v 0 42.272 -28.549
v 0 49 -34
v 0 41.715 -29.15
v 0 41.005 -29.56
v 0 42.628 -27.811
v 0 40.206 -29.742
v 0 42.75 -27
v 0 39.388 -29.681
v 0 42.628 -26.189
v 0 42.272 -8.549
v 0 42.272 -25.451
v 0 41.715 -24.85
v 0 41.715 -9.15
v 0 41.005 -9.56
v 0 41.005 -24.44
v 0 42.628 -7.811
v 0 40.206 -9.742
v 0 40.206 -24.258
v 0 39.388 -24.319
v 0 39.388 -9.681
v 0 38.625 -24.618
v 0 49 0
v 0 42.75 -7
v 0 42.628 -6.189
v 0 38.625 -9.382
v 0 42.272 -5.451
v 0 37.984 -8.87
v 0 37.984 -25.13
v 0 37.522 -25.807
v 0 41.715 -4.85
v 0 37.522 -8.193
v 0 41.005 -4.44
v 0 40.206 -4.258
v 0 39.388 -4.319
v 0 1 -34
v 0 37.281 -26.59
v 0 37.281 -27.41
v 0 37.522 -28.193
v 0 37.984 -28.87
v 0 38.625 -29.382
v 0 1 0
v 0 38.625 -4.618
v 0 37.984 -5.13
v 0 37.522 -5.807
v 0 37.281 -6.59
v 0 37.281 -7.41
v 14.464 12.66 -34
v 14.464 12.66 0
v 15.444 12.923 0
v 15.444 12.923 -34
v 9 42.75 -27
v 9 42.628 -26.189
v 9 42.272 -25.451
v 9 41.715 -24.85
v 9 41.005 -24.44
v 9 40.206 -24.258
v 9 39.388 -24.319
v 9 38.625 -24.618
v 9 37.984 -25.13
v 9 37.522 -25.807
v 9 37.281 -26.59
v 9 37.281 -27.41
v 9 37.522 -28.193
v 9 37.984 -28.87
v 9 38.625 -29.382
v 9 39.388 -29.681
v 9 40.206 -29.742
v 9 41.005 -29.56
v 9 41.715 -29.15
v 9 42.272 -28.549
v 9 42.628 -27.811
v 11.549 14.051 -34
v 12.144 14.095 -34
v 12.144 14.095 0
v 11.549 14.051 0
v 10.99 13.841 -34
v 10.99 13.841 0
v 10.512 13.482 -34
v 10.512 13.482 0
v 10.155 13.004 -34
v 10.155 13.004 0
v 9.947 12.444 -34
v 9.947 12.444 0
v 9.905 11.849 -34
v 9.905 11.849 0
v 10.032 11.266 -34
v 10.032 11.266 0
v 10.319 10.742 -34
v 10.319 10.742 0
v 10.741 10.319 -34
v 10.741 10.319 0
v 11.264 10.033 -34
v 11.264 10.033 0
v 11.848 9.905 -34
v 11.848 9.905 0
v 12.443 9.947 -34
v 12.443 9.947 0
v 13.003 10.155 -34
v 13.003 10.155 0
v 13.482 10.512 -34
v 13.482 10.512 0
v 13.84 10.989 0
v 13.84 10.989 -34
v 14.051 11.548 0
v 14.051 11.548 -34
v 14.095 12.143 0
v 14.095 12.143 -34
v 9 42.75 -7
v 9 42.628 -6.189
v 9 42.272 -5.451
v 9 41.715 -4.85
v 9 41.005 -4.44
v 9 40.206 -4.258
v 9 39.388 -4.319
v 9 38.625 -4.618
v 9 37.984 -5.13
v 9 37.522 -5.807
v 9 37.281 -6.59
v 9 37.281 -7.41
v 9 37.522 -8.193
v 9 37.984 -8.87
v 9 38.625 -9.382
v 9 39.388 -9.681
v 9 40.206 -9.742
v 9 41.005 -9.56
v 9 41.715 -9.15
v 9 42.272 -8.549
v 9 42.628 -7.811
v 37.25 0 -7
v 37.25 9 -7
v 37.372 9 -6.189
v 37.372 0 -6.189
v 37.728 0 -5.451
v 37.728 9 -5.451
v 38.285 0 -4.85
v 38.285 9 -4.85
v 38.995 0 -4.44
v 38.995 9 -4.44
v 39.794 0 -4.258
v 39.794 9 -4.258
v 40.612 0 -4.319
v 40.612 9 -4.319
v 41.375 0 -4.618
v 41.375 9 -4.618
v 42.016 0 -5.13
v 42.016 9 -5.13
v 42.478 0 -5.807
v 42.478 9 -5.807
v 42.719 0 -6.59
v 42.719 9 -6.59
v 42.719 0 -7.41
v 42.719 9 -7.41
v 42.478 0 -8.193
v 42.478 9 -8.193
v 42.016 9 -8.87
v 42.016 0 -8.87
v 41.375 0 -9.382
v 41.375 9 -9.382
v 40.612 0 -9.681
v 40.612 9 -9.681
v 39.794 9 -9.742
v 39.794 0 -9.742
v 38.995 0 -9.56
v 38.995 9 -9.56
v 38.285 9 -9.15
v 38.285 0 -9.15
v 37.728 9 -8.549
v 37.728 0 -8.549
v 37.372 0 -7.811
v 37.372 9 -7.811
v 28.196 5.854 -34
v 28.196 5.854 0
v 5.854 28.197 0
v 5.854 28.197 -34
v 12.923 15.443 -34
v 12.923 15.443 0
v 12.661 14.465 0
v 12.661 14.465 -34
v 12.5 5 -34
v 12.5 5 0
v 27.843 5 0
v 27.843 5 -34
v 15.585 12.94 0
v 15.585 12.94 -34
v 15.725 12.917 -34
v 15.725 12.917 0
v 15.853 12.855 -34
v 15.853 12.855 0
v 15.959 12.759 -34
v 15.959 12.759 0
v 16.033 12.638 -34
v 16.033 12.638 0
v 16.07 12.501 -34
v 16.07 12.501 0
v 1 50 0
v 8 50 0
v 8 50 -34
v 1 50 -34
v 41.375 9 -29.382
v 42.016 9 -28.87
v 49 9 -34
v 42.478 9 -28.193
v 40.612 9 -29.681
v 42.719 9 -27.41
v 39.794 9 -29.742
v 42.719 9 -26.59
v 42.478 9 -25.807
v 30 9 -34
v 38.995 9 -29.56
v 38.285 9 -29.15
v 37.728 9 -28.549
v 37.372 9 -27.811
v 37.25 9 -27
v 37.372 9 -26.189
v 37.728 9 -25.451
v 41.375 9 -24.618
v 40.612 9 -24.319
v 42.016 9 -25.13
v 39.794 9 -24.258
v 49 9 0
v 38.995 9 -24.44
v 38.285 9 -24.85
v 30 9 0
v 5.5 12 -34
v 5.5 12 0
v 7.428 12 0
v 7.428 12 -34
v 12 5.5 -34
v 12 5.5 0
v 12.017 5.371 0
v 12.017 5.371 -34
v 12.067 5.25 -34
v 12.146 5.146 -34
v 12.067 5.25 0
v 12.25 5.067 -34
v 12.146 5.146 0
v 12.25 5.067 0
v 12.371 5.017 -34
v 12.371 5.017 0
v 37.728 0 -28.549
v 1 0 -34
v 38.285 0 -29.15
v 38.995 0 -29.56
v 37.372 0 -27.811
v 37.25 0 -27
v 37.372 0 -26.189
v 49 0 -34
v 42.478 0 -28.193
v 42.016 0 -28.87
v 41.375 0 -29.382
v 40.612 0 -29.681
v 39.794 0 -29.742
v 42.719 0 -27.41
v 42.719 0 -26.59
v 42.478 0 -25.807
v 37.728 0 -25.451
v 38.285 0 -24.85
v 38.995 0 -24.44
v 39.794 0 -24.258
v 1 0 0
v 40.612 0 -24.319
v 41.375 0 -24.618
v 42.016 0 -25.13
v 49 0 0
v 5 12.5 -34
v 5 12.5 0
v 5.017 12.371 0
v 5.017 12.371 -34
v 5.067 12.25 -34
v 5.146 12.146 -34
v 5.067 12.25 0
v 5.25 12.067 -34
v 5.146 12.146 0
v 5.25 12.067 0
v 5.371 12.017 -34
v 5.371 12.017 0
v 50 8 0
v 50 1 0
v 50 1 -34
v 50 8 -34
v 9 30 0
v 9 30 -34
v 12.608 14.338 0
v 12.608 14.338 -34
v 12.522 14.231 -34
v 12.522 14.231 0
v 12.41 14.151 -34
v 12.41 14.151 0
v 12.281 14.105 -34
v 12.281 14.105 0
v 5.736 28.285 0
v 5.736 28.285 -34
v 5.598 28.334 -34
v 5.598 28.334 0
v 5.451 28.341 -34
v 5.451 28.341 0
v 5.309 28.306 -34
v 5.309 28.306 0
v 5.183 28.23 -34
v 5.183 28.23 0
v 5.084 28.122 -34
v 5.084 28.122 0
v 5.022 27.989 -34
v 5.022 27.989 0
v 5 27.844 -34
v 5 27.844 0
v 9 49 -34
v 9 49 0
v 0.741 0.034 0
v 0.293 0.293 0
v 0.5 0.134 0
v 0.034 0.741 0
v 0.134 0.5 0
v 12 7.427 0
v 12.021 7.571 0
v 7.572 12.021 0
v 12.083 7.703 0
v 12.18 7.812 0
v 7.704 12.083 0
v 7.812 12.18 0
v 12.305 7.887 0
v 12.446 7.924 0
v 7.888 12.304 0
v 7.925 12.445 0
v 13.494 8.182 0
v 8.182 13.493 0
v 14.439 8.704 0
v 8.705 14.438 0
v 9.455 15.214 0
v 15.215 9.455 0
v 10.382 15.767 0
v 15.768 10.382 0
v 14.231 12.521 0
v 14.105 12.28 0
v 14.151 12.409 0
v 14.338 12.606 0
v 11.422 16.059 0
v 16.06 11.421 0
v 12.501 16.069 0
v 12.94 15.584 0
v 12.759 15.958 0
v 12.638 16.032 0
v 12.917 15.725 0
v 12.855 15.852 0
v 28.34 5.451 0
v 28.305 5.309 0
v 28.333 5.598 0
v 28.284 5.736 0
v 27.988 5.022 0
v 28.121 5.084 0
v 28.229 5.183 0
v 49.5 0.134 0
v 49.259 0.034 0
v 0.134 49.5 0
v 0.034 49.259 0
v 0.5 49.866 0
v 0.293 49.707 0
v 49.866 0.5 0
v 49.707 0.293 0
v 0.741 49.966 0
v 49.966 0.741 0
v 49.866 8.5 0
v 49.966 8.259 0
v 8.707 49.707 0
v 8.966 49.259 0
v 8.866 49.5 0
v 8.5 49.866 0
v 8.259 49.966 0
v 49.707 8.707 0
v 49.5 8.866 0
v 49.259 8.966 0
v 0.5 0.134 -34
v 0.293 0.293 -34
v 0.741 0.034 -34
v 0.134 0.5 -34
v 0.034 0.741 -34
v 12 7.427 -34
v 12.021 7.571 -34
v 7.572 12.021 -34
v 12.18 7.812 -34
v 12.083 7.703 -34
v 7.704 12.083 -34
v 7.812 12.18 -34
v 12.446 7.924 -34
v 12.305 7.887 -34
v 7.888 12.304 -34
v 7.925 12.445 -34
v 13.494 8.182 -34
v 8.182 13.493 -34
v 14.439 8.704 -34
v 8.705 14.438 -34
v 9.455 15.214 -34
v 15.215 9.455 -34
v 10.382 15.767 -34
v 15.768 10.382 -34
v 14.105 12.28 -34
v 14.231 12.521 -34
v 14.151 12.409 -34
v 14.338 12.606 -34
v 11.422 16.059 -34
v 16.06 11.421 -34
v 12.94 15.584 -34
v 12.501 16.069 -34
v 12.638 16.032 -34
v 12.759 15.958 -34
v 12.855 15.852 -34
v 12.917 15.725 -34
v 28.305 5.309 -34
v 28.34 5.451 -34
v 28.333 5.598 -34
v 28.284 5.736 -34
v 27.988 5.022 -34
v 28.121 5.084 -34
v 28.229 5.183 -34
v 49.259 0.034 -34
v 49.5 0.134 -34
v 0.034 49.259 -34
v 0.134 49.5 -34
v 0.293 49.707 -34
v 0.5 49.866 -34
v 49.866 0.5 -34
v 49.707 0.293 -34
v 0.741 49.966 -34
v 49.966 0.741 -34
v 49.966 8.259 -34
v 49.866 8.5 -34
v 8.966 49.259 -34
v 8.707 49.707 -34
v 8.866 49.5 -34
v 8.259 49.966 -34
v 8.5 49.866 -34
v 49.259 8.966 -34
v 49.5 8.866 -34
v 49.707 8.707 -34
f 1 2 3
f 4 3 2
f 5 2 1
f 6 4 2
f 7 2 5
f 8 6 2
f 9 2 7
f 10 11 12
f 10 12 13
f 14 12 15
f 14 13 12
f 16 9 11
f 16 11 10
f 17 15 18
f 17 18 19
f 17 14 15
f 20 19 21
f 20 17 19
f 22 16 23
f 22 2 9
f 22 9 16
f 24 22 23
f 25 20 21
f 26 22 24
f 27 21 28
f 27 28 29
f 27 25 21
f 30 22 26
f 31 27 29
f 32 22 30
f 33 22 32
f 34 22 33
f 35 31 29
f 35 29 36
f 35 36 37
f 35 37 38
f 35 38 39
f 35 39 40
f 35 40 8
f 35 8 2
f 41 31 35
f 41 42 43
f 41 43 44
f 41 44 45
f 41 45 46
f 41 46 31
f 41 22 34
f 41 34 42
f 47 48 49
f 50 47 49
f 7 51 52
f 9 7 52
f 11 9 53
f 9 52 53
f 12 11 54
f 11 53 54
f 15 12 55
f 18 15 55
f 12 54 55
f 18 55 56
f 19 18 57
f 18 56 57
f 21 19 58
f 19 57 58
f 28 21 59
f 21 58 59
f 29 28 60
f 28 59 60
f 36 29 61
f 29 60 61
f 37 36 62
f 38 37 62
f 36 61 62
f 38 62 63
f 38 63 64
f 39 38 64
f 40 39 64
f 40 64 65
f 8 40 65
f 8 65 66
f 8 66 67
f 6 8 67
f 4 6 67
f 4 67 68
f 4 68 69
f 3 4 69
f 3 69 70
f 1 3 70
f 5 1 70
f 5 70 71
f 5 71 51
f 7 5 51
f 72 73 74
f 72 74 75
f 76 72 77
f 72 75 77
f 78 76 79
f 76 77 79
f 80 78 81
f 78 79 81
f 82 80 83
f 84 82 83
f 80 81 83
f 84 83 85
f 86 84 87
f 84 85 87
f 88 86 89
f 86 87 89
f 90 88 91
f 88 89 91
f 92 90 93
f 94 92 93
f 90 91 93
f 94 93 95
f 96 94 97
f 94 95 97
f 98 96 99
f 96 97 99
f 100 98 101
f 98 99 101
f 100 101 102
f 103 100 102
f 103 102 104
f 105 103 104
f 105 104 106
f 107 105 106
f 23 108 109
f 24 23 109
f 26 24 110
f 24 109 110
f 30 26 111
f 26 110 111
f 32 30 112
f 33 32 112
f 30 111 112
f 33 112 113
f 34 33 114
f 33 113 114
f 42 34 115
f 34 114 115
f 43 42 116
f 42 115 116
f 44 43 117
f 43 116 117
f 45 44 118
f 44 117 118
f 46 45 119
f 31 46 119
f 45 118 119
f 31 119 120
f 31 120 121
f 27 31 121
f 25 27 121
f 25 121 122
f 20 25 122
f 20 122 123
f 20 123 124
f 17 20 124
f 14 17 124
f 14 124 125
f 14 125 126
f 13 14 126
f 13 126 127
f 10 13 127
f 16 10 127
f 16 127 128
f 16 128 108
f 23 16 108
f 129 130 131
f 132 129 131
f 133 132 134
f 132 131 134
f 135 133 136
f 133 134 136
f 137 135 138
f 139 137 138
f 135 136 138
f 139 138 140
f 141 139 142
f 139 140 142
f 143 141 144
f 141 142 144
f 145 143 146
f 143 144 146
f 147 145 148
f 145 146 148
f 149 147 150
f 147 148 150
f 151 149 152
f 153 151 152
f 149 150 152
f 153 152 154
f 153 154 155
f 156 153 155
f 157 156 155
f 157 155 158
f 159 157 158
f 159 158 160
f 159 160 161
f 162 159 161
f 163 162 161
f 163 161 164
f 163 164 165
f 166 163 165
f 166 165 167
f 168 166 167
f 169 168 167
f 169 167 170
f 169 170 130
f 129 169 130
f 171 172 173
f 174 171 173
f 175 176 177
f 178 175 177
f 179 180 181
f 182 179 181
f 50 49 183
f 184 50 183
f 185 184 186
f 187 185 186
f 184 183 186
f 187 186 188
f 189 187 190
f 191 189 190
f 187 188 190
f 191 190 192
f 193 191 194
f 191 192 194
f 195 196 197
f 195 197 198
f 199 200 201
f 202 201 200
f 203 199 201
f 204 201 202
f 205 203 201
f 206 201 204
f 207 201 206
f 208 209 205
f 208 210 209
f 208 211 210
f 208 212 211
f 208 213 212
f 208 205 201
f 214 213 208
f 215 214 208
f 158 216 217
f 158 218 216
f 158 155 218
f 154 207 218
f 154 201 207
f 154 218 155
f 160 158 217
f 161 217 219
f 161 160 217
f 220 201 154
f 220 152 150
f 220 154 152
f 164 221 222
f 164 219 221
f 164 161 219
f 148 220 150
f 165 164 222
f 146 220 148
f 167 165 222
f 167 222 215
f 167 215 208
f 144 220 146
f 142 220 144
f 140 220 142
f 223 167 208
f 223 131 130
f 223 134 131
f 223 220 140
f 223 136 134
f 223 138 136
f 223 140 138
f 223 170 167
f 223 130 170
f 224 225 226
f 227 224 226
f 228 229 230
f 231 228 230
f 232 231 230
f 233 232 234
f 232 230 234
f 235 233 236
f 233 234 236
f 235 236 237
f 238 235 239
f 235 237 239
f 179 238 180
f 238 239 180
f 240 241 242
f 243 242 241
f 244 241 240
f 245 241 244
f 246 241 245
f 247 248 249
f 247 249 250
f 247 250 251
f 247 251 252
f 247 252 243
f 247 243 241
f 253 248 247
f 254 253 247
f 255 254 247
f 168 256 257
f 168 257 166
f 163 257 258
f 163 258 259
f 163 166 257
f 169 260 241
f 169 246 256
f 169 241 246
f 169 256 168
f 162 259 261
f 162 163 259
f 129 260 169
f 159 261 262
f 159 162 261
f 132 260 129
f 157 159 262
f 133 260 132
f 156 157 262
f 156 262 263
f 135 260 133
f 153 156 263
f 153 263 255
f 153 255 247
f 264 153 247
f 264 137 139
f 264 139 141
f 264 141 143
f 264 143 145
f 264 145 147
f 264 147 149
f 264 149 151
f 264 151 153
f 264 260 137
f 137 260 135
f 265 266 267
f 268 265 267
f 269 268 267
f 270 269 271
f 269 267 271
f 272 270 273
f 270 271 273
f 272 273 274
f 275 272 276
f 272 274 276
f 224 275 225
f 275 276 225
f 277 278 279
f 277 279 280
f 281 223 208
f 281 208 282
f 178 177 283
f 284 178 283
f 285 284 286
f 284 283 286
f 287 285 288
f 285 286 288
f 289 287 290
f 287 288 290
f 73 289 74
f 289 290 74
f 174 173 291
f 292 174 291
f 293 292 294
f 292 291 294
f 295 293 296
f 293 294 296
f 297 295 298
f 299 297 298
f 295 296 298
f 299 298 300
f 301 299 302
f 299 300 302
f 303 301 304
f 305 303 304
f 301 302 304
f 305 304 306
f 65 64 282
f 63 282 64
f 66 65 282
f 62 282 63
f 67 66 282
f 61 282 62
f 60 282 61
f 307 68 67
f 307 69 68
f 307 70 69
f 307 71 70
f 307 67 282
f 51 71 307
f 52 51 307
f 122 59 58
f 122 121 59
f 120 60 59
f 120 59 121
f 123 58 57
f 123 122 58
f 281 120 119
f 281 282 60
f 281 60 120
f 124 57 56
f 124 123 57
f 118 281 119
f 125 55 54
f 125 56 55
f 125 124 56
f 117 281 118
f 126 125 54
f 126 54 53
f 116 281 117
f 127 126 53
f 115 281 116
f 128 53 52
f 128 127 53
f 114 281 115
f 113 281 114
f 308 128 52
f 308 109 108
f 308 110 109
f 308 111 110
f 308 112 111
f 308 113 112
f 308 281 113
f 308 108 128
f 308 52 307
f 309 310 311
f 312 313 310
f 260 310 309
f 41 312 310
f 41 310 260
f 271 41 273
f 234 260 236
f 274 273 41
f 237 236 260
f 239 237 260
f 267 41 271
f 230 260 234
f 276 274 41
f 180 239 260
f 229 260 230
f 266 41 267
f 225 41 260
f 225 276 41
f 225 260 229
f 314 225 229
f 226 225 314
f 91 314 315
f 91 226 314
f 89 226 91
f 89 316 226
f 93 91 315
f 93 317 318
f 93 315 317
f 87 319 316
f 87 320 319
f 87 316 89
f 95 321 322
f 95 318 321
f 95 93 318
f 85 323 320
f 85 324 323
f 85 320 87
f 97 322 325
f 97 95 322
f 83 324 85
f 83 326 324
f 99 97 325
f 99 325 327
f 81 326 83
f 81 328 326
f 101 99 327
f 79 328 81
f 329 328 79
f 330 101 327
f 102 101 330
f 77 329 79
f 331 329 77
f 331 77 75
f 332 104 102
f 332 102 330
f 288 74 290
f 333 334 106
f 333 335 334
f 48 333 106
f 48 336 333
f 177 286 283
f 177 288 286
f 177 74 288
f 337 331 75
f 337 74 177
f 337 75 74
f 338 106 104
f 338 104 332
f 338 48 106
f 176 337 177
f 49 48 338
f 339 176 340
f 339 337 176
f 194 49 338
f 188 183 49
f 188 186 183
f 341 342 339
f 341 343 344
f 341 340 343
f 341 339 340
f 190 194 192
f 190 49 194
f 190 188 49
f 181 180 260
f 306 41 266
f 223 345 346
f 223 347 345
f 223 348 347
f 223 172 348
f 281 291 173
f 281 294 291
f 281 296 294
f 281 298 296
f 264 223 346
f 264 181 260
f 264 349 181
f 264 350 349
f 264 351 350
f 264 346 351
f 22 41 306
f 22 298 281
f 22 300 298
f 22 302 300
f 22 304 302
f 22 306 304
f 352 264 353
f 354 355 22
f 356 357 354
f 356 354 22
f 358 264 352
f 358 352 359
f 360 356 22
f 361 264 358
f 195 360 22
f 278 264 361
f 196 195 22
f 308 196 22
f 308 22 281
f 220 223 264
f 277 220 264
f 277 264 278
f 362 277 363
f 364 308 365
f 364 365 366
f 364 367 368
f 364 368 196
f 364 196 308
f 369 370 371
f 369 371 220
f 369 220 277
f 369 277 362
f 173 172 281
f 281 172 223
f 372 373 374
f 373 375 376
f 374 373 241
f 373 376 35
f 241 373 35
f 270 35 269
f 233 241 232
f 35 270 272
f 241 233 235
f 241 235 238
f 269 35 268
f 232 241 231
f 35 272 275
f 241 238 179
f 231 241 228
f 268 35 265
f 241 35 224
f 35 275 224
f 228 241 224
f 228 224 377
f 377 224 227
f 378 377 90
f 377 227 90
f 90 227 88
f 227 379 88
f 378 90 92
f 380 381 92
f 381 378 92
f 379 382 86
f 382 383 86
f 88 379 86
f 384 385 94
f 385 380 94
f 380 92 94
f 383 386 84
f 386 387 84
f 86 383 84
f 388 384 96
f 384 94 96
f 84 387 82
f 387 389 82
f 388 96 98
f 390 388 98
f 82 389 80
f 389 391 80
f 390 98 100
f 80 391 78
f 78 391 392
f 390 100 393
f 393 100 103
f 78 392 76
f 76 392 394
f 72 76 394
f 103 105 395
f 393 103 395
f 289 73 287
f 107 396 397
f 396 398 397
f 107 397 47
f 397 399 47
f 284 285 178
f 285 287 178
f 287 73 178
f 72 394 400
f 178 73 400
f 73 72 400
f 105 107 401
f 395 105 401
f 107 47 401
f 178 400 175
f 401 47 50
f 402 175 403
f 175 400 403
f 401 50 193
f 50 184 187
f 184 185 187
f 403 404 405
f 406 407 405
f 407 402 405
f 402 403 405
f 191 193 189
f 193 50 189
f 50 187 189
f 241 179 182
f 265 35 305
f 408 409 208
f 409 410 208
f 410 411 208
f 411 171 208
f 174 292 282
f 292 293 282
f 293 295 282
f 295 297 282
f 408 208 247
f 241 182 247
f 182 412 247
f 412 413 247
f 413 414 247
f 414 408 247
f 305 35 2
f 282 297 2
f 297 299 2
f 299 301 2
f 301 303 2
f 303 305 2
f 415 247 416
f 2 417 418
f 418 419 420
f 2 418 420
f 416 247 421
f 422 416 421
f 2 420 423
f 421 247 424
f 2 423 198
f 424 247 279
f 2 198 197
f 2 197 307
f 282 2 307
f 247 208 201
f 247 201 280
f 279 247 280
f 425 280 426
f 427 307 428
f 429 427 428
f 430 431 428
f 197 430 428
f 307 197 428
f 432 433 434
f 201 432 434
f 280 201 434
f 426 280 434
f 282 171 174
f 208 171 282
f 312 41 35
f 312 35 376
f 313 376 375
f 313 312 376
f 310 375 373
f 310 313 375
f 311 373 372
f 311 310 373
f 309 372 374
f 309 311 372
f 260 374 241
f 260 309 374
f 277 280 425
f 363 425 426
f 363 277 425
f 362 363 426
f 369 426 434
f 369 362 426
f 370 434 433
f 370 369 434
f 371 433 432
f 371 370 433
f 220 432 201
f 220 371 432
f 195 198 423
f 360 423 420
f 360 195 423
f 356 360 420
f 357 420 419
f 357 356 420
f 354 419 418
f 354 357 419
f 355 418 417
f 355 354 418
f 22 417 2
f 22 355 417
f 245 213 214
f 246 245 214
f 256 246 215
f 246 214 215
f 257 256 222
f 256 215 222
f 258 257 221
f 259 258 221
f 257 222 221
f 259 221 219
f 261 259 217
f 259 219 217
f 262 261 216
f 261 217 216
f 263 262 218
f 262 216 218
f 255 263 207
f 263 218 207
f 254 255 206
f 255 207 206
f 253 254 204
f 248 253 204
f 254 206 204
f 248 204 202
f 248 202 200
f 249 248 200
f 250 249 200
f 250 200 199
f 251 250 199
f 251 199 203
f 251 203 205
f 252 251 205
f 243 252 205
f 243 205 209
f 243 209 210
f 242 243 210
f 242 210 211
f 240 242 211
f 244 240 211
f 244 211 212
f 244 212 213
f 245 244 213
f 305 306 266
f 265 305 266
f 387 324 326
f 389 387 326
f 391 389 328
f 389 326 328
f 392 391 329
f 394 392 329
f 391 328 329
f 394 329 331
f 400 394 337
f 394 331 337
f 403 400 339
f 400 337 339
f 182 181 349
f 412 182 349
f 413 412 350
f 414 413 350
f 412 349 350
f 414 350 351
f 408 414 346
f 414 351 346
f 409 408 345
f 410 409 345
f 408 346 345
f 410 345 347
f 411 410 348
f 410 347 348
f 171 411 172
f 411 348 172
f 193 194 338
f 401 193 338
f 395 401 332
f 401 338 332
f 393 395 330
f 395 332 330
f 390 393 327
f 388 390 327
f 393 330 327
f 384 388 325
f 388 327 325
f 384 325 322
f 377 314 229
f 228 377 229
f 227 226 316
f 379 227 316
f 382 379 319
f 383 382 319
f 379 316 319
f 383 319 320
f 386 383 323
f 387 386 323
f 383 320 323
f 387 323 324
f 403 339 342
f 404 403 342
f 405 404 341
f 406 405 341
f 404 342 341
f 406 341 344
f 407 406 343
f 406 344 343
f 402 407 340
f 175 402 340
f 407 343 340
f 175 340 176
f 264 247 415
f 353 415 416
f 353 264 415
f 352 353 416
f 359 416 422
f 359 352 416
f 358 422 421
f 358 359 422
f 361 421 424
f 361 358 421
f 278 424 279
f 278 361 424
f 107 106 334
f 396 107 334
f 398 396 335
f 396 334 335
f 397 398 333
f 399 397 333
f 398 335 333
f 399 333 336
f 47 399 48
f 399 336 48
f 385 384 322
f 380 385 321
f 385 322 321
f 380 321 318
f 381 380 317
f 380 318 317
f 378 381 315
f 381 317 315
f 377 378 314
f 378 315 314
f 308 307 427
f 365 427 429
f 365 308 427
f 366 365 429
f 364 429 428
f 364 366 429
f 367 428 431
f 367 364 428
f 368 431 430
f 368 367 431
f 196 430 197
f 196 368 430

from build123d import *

# Parameters (mm, degrees)
EXTRUDE_11_DEPTH     = 34
SKETCH_32_R          = 2.75
CUT_EXTRUDE_21_DEPTH = 74.054773971
SKETCH_33_R          = 2.75
CUT_EXTRUDE_22_DEPTH = 74.054773971


with BuildPart() as part:
    # 草图31 → 凸台-拉伸11 (new body)
    with BuildSketch(Plane.XY):
        with BuildLine():
            Line((9, 30), (9, 49))
            ThreePointArc((9, 49), (8.707106781, 49.707106781), (8, 50))
            Line((8, 50), (1, 50))
            ThreePointArc((1, 50), (0.292893219, 49.707106781), (0, 49))
            Line((0, 49), (0, 1))
            ThreePointArc((0, 1), (0.292893219, 0.292893219), (1, 0))
            Line((1, 0), (49, 0))
            ThreePointArc((49, 0), (49.707106781, 0.292893219), (50, 1))
            Line((50, 1), (50, 8))
            ThreePointArc((50, 8), (49.707106781, 8.707106781), (49, 9))
            Line((49, 9), (30, 9))
            Line((30, 9), (9, 30))
        make_face()
        with BuildLine():
            Line((5.5, 12), (7.428034206, 12))
            ThreePointArc((7.428034206, 12), (7.761575809, 12.12750839), (7.925, 12.445000002))
            ThreePointArc((7.925, 12.445000002), (9.455281372, 15.213766146), (12.501000023, 16.068999997))
            ThreePointArc((12.501000023, 16.068999997), (12.854580588, 15.852403205), (12.923122843, 15.443459021))
            Line((12.923122843, 15.443459021), (12.661152875, 14.464571239))
            ThreePointArc((12.661152875, 14.464571239), (12.468861163, 14.187031274), (12.143999993, 14.095))
            ThreePointArc((12.143999993, 14.095), (10.514573143, 10.515407625), (14.095, 12.143000006))
            ThreePointArc((14.095, 12.143000006), (14.186987516, 12.467511304), (14.464129015, 12.659766017))
            Line((14.464129015, 12.659766017), (15.443998772, 12.92299967))
            ThreePointArc((15.443998772, 12.92299967), (15.853205766, 12.854713962), (16.069999999, 12.501000008))
            ThreePointArc((16.069999999, 12.501000008), (15.215158243, 9.454636454), (12.446, 7.924))
            ThreePointArc((12.446, 7.924), (12.127844119, 7.76084071), (12, 7.426924553))
            Line((12, 7.426924553), (12, 5.5))
            ThreePointArc((12, 5.5), (12.146446609, 5.146446609), (12.5, 5))
            Line((12.5, 5), (27.842893456, 5))
            ThreePointArc((27.842893456, 5), (28.30483088, 5.308653143), (28.196454654, 5.853545371))
            Line((28.196454654, 5.853545371), (5.853561034, 28.197438986))
            ThreePointArc((5.853561034, 28.197438986), (5.308663433, 28.305835138), (5, 27.843893575))
            Line((5, 27.843893575), (5, 12.5))
            ThreePointArc((5, 12.5), (5.146446609, 12.146446609), (5.5, 12))
        make_face(mode=Mode.SUBTRACT)
    extrude(amount=-EXTRUDE_11_DEPTH)

    # 草图32 → 切除-拉伸21 (cut, through all)
    with BuildSketch(Plane(origin=(0, 9, 0), x_dir=(1, 0, 0), z_dir=(0, 1, 0))):
        with Locations((40, 27)):
            Circle(SKETCH_32_R)
        with Locations((40, 7)):
            Circle(SKETCH_32_R)
    extrude(amount=-CUT_EXTRUDE_21_DEPTH, mode=Mode.SUBTRACT)

    # 草图33 → 切除-拉伸22 (cut, through all)
    with BuildSketch(Plane(origin=(9, 0, 0), x_dir=(0, 0, -1), z_dir=(1, 0, 0))):
        with Locations((7, 40)):
            Circle(SKETCH_33_R)
        with Locations((27, 40)):
            Circle(SKETCH_33_R)
    extrude(amount=-CUT_EXTRUDE_22_DEPTH, mode=Mode.SUBTRACT)


solid = part.part
